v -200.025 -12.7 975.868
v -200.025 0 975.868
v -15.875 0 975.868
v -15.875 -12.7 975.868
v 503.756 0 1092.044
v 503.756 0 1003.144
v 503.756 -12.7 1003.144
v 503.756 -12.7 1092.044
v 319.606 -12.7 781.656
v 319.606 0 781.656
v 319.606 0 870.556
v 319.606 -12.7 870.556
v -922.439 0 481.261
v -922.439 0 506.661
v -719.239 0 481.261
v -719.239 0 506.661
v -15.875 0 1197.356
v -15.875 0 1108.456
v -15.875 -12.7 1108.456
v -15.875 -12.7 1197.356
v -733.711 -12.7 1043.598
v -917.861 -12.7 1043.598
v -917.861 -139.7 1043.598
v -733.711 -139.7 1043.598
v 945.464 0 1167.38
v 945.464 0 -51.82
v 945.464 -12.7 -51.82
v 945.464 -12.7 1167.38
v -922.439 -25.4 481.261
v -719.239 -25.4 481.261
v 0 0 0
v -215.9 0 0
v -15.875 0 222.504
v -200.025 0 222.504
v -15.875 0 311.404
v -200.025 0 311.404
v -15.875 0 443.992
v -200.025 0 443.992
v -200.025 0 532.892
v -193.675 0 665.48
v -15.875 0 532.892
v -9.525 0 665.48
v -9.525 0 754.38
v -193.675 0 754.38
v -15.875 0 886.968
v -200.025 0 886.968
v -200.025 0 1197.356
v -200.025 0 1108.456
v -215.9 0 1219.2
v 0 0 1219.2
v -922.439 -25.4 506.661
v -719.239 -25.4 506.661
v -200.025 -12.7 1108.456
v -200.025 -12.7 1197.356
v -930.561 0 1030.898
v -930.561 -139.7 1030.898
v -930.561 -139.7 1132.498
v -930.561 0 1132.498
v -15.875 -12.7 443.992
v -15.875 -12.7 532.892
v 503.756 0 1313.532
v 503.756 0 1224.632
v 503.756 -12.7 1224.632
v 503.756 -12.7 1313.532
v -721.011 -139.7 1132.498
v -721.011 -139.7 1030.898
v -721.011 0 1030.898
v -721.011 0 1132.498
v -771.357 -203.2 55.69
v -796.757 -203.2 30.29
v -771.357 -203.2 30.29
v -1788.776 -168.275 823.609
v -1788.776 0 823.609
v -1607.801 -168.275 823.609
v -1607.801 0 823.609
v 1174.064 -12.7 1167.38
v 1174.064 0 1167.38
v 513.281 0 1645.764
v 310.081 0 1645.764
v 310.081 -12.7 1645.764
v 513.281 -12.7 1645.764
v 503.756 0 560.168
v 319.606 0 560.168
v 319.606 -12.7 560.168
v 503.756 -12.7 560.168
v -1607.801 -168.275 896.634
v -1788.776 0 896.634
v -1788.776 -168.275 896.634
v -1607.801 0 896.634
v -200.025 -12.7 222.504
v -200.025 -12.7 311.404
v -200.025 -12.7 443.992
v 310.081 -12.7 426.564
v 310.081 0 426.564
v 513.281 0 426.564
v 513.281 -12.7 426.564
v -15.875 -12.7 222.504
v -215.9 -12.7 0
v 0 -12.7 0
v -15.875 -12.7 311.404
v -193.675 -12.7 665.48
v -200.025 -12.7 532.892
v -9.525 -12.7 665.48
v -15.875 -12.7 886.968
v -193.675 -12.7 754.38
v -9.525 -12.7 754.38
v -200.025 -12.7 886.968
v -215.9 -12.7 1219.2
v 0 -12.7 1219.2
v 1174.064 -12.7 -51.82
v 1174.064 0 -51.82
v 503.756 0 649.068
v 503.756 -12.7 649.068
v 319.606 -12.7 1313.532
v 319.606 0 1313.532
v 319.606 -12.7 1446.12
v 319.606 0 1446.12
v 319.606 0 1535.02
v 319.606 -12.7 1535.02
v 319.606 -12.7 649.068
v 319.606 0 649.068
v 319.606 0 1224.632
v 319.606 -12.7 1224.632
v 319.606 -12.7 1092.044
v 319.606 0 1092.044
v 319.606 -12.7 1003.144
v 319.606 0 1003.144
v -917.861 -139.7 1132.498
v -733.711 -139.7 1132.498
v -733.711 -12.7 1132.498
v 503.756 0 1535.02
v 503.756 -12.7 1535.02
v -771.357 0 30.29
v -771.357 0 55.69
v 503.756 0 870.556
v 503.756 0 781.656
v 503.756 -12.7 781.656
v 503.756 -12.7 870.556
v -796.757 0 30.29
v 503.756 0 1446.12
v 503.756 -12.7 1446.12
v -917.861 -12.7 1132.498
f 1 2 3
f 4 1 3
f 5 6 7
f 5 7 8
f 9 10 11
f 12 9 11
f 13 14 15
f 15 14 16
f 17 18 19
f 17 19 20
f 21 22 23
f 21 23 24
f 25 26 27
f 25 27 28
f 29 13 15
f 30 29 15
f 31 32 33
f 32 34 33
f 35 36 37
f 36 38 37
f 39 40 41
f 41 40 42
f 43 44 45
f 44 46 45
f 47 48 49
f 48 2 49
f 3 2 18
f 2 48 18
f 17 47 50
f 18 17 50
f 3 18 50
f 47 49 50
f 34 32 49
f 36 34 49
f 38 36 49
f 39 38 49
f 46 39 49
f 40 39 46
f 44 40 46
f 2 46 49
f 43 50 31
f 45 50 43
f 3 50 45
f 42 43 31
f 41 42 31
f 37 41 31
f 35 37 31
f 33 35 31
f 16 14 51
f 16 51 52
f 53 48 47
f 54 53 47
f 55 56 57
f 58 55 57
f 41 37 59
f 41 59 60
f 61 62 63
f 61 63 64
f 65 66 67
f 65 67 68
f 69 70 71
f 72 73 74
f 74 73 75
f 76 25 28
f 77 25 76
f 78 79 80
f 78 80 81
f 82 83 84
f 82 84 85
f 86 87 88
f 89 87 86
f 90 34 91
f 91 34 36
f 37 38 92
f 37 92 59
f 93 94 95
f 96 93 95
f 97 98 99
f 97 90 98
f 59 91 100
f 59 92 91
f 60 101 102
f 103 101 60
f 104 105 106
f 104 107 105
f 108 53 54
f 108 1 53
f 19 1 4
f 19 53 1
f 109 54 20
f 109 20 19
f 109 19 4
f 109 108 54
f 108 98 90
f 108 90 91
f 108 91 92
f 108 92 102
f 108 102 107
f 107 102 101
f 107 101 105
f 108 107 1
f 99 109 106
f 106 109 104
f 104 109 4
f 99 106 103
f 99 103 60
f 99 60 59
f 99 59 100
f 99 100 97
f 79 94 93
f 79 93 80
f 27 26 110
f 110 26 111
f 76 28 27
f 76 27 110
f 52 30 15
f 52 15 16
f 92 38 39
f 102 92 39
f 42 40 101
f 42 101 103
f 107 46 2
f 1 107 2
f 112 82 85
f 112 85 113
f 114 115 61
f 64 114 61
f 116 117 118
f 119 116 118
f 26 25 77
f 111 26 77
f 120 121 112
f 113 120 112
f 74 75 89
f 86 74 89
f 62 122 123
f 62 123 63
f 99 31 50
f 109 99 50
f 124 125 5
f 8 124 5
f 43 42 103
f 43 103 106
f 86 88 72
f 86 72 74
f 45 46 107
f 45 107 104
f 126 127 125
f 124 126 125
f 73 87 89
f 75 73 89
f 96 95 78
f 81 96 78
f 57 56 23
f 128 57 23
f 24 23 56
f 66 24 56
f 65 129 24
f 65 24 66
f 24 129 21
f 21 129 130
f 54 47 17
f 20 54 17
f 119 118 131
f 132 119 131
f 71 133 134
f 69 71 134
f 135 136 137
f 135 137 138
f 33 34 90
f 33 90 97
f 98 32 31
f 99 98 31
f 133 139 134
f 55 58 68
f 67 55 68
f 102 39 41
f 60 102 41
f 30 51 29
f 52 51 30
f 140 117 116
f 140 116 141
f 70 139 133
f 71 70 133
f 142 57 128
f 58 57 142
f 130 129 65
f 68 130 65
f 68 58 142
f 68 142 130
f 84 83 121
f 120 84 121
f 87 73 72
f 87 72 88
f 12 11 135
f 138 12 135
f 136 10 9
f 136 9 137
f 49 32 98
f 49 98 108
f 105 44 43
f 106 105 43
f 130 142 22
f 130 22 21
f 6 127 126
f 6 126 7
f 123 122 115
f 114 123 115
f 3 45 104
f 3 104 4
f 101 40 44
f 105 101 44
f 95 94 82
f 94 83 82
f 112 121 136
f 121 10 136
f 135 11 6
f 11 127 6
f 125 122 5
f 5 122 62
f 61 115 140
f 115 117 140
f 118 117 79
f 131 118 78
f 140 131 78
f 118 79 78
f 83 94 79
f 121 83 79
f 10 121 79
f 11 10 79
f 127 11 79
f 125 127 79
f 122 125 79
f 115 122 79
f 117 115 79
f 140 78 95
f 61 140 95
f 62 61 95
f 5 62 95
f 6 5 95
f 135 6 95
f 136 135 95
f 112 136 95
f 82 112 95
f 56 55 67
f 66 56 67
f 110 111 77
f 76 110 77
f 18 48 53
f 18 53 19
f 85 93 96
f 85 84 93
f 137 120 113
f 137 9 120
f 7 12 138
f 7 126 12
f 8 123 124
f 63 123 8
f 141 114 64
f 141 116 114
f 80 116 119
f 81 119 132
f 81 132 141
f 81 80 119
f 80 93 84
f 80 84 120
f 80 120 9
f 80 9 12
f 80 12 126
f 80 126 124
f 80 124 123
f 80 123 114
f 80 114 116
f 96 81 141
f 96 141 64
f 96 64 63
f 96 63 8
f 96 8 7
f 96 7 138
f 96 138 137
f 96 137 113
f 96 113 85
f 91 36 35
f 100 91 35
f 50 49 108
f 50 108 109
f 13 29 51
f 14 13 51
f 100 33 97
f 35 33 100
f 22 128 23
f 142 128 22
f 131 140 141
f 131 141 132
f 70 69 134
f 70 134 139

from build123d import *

# Parameters (mm, degrees)
F0_W      = 215.9
F0_H      = 1219.2
F0_W_2    = 184.15
F0_H_2    = 88.9
F1_DEPTH  = 12.7
F2_W      = 203.2
F2_H      = 1219.2
F2_W_2    = 184.15
F2_H_2    = 88.9
F3_DEPTH  = 12.7
F4_W      = 209.55
F4_H      = 101.6
F5_DEPTH  = 139.7
F6_W      = 184.15
F6_H      = 127
F7_DEPTH  = 88.9
F8_W      = 203.2
F8_H      = 25.4
F10_DEPTH = 25.4
F9_W      = 180.975
F9_H      = 73.025
F11_DEPTH = 168.275
F12_W     = 228.6
F12_H     = 1219.2
F13_DEPTH = 12.7
F15_DEPTH = 203.2


# Not quite as in the source:
# - a feature names something its author has since deleted; it is built from what else it names


with BuildPart() as f1:
    # F0 (on Front) → F1 (new body)
    with BuildSketch(Plane.XZ):
        with Locations((-107.95, 609.6)):
            Rectangle(F0_W, F0_H)
        with Locations((-107.95, 266.954)):
            Rectangle(F0_W_2, F0_H_2, mode=Mode.SUBTRACT)
        with Locations((-107.95, 488.442)):
            Rectangle(F0_W_2, F0_H_2, mode=Mode.SUBTRACT)
        with Locations((-101.6, 709.93)):
            Rectangle(F0_W_2, F0_H_2, mode=Mode.SUBTRACT)
        with Locations((-107.95, 931.418)):
            Rectangle(F0_W_2, F0_H_2, mode=Mode.SUBTRACT)
        with Locations((-107.95, 1152.906)):
            Rectangle(F0_W_2, F0_H_2, mode=Mode.SUBTRACT)
    extrude(amount=F1_DEPTH)


with BuildPart() as f3:
    # F2 (on Front) → F3 (new body)
    with BuildSketch(Plane.XZ):
        with Locations((411.6813279688, 1036.1642371192)):
            Rectangle(F2_W, F2_H)
        with Locations((411.6813279688, 604.6182371192)):
            Rectangle(F2_W_2, F2_H_2, mode=Mode.SUBTRACT)
        with Locations((411.6813279688, 826.1062371192)):
            Rectangle(F2_W_2, F2_H_2, mode=Mode.SUBTRACT)
        with Locations((411.6813279688, 1047.5942371192)):
            Rectangle(F2_W_2, F2_H_2, mode=Mode.SUBTRACT)
        with Locations((411.6813279688, 1269.0822371192)):
            Rectangle(F2_W_2, F2_H_2, mode=Mode.SUBTRACT)
        with Locations((411.6813279688, 1490.5702371192)):
            Rectangle(F2_W_2, F2_H_2, mode=Mode.SUBTRACT)
    extrude(amount=F3_DEPTH)


with BuildPart() as f5:
    # F4 (on Front) → F5 (new body)
    with BuildSketch(Plane.XZ):
        with Locations((-825.7857475758, 1081.6975569915)):
            Rectangle(F4_W, F4_H)
    extrude(amount=F5_DEPTH)

    # F6 (on face) → F7 (cut)
    with BuildSketch(Plane.XY.offset(1132.4975569915)):
        with Locations((-825.7857475758, -76.2)):
            Rectangle(F6_W, F6_H)
    extrude(amount=-F7_DEPTH, mode=Mode.SUBTRACT)


with BuildPart() as f10:
    # F8 (on Front) → F10 (new body)
    with BuildSketch(Plane.XZ):
        with Locations((-820.838779211, 493.9609521501)):
            Rectangle(F8_W, F8_H)
    extrude(amount=F10_DEPTH)


with BuildPart() as f11:
    # F9 (on Front) → F11 (new body)
    with BuildSketch(Plane.XZ):
        with Locations((-1698.2888811625, 860.1219307423)):
            Rectangle(F9_W, F9_H)
    extrude(amount=F11_DEPTH)


with BuildPart() as f13:
    # F12 (on Front) → F13 (new body)
    with BuildSketch(Plane.XZ):
        with Locations((1059.7636188984, 557.7803601671)):
            Rectangle(F12_W, F12_H)
    extrude(amount=F13_DEPTH)


with BuildPart() as f15:
    # F14 (on Front) → F15 (new body)
    with BuildSketch(Plane.XZ):
        Polygon((-771.3568039894, 30.289914459), (-771.3568039894, 55.689914459), (-796.7568039894, 30.289914459), align=None)
    extrude(amount=F15_DEPTH)


solid = Compound([f1.part, f3.part, f5.part, f10.part, f11.part, f13.part, f15.part])
